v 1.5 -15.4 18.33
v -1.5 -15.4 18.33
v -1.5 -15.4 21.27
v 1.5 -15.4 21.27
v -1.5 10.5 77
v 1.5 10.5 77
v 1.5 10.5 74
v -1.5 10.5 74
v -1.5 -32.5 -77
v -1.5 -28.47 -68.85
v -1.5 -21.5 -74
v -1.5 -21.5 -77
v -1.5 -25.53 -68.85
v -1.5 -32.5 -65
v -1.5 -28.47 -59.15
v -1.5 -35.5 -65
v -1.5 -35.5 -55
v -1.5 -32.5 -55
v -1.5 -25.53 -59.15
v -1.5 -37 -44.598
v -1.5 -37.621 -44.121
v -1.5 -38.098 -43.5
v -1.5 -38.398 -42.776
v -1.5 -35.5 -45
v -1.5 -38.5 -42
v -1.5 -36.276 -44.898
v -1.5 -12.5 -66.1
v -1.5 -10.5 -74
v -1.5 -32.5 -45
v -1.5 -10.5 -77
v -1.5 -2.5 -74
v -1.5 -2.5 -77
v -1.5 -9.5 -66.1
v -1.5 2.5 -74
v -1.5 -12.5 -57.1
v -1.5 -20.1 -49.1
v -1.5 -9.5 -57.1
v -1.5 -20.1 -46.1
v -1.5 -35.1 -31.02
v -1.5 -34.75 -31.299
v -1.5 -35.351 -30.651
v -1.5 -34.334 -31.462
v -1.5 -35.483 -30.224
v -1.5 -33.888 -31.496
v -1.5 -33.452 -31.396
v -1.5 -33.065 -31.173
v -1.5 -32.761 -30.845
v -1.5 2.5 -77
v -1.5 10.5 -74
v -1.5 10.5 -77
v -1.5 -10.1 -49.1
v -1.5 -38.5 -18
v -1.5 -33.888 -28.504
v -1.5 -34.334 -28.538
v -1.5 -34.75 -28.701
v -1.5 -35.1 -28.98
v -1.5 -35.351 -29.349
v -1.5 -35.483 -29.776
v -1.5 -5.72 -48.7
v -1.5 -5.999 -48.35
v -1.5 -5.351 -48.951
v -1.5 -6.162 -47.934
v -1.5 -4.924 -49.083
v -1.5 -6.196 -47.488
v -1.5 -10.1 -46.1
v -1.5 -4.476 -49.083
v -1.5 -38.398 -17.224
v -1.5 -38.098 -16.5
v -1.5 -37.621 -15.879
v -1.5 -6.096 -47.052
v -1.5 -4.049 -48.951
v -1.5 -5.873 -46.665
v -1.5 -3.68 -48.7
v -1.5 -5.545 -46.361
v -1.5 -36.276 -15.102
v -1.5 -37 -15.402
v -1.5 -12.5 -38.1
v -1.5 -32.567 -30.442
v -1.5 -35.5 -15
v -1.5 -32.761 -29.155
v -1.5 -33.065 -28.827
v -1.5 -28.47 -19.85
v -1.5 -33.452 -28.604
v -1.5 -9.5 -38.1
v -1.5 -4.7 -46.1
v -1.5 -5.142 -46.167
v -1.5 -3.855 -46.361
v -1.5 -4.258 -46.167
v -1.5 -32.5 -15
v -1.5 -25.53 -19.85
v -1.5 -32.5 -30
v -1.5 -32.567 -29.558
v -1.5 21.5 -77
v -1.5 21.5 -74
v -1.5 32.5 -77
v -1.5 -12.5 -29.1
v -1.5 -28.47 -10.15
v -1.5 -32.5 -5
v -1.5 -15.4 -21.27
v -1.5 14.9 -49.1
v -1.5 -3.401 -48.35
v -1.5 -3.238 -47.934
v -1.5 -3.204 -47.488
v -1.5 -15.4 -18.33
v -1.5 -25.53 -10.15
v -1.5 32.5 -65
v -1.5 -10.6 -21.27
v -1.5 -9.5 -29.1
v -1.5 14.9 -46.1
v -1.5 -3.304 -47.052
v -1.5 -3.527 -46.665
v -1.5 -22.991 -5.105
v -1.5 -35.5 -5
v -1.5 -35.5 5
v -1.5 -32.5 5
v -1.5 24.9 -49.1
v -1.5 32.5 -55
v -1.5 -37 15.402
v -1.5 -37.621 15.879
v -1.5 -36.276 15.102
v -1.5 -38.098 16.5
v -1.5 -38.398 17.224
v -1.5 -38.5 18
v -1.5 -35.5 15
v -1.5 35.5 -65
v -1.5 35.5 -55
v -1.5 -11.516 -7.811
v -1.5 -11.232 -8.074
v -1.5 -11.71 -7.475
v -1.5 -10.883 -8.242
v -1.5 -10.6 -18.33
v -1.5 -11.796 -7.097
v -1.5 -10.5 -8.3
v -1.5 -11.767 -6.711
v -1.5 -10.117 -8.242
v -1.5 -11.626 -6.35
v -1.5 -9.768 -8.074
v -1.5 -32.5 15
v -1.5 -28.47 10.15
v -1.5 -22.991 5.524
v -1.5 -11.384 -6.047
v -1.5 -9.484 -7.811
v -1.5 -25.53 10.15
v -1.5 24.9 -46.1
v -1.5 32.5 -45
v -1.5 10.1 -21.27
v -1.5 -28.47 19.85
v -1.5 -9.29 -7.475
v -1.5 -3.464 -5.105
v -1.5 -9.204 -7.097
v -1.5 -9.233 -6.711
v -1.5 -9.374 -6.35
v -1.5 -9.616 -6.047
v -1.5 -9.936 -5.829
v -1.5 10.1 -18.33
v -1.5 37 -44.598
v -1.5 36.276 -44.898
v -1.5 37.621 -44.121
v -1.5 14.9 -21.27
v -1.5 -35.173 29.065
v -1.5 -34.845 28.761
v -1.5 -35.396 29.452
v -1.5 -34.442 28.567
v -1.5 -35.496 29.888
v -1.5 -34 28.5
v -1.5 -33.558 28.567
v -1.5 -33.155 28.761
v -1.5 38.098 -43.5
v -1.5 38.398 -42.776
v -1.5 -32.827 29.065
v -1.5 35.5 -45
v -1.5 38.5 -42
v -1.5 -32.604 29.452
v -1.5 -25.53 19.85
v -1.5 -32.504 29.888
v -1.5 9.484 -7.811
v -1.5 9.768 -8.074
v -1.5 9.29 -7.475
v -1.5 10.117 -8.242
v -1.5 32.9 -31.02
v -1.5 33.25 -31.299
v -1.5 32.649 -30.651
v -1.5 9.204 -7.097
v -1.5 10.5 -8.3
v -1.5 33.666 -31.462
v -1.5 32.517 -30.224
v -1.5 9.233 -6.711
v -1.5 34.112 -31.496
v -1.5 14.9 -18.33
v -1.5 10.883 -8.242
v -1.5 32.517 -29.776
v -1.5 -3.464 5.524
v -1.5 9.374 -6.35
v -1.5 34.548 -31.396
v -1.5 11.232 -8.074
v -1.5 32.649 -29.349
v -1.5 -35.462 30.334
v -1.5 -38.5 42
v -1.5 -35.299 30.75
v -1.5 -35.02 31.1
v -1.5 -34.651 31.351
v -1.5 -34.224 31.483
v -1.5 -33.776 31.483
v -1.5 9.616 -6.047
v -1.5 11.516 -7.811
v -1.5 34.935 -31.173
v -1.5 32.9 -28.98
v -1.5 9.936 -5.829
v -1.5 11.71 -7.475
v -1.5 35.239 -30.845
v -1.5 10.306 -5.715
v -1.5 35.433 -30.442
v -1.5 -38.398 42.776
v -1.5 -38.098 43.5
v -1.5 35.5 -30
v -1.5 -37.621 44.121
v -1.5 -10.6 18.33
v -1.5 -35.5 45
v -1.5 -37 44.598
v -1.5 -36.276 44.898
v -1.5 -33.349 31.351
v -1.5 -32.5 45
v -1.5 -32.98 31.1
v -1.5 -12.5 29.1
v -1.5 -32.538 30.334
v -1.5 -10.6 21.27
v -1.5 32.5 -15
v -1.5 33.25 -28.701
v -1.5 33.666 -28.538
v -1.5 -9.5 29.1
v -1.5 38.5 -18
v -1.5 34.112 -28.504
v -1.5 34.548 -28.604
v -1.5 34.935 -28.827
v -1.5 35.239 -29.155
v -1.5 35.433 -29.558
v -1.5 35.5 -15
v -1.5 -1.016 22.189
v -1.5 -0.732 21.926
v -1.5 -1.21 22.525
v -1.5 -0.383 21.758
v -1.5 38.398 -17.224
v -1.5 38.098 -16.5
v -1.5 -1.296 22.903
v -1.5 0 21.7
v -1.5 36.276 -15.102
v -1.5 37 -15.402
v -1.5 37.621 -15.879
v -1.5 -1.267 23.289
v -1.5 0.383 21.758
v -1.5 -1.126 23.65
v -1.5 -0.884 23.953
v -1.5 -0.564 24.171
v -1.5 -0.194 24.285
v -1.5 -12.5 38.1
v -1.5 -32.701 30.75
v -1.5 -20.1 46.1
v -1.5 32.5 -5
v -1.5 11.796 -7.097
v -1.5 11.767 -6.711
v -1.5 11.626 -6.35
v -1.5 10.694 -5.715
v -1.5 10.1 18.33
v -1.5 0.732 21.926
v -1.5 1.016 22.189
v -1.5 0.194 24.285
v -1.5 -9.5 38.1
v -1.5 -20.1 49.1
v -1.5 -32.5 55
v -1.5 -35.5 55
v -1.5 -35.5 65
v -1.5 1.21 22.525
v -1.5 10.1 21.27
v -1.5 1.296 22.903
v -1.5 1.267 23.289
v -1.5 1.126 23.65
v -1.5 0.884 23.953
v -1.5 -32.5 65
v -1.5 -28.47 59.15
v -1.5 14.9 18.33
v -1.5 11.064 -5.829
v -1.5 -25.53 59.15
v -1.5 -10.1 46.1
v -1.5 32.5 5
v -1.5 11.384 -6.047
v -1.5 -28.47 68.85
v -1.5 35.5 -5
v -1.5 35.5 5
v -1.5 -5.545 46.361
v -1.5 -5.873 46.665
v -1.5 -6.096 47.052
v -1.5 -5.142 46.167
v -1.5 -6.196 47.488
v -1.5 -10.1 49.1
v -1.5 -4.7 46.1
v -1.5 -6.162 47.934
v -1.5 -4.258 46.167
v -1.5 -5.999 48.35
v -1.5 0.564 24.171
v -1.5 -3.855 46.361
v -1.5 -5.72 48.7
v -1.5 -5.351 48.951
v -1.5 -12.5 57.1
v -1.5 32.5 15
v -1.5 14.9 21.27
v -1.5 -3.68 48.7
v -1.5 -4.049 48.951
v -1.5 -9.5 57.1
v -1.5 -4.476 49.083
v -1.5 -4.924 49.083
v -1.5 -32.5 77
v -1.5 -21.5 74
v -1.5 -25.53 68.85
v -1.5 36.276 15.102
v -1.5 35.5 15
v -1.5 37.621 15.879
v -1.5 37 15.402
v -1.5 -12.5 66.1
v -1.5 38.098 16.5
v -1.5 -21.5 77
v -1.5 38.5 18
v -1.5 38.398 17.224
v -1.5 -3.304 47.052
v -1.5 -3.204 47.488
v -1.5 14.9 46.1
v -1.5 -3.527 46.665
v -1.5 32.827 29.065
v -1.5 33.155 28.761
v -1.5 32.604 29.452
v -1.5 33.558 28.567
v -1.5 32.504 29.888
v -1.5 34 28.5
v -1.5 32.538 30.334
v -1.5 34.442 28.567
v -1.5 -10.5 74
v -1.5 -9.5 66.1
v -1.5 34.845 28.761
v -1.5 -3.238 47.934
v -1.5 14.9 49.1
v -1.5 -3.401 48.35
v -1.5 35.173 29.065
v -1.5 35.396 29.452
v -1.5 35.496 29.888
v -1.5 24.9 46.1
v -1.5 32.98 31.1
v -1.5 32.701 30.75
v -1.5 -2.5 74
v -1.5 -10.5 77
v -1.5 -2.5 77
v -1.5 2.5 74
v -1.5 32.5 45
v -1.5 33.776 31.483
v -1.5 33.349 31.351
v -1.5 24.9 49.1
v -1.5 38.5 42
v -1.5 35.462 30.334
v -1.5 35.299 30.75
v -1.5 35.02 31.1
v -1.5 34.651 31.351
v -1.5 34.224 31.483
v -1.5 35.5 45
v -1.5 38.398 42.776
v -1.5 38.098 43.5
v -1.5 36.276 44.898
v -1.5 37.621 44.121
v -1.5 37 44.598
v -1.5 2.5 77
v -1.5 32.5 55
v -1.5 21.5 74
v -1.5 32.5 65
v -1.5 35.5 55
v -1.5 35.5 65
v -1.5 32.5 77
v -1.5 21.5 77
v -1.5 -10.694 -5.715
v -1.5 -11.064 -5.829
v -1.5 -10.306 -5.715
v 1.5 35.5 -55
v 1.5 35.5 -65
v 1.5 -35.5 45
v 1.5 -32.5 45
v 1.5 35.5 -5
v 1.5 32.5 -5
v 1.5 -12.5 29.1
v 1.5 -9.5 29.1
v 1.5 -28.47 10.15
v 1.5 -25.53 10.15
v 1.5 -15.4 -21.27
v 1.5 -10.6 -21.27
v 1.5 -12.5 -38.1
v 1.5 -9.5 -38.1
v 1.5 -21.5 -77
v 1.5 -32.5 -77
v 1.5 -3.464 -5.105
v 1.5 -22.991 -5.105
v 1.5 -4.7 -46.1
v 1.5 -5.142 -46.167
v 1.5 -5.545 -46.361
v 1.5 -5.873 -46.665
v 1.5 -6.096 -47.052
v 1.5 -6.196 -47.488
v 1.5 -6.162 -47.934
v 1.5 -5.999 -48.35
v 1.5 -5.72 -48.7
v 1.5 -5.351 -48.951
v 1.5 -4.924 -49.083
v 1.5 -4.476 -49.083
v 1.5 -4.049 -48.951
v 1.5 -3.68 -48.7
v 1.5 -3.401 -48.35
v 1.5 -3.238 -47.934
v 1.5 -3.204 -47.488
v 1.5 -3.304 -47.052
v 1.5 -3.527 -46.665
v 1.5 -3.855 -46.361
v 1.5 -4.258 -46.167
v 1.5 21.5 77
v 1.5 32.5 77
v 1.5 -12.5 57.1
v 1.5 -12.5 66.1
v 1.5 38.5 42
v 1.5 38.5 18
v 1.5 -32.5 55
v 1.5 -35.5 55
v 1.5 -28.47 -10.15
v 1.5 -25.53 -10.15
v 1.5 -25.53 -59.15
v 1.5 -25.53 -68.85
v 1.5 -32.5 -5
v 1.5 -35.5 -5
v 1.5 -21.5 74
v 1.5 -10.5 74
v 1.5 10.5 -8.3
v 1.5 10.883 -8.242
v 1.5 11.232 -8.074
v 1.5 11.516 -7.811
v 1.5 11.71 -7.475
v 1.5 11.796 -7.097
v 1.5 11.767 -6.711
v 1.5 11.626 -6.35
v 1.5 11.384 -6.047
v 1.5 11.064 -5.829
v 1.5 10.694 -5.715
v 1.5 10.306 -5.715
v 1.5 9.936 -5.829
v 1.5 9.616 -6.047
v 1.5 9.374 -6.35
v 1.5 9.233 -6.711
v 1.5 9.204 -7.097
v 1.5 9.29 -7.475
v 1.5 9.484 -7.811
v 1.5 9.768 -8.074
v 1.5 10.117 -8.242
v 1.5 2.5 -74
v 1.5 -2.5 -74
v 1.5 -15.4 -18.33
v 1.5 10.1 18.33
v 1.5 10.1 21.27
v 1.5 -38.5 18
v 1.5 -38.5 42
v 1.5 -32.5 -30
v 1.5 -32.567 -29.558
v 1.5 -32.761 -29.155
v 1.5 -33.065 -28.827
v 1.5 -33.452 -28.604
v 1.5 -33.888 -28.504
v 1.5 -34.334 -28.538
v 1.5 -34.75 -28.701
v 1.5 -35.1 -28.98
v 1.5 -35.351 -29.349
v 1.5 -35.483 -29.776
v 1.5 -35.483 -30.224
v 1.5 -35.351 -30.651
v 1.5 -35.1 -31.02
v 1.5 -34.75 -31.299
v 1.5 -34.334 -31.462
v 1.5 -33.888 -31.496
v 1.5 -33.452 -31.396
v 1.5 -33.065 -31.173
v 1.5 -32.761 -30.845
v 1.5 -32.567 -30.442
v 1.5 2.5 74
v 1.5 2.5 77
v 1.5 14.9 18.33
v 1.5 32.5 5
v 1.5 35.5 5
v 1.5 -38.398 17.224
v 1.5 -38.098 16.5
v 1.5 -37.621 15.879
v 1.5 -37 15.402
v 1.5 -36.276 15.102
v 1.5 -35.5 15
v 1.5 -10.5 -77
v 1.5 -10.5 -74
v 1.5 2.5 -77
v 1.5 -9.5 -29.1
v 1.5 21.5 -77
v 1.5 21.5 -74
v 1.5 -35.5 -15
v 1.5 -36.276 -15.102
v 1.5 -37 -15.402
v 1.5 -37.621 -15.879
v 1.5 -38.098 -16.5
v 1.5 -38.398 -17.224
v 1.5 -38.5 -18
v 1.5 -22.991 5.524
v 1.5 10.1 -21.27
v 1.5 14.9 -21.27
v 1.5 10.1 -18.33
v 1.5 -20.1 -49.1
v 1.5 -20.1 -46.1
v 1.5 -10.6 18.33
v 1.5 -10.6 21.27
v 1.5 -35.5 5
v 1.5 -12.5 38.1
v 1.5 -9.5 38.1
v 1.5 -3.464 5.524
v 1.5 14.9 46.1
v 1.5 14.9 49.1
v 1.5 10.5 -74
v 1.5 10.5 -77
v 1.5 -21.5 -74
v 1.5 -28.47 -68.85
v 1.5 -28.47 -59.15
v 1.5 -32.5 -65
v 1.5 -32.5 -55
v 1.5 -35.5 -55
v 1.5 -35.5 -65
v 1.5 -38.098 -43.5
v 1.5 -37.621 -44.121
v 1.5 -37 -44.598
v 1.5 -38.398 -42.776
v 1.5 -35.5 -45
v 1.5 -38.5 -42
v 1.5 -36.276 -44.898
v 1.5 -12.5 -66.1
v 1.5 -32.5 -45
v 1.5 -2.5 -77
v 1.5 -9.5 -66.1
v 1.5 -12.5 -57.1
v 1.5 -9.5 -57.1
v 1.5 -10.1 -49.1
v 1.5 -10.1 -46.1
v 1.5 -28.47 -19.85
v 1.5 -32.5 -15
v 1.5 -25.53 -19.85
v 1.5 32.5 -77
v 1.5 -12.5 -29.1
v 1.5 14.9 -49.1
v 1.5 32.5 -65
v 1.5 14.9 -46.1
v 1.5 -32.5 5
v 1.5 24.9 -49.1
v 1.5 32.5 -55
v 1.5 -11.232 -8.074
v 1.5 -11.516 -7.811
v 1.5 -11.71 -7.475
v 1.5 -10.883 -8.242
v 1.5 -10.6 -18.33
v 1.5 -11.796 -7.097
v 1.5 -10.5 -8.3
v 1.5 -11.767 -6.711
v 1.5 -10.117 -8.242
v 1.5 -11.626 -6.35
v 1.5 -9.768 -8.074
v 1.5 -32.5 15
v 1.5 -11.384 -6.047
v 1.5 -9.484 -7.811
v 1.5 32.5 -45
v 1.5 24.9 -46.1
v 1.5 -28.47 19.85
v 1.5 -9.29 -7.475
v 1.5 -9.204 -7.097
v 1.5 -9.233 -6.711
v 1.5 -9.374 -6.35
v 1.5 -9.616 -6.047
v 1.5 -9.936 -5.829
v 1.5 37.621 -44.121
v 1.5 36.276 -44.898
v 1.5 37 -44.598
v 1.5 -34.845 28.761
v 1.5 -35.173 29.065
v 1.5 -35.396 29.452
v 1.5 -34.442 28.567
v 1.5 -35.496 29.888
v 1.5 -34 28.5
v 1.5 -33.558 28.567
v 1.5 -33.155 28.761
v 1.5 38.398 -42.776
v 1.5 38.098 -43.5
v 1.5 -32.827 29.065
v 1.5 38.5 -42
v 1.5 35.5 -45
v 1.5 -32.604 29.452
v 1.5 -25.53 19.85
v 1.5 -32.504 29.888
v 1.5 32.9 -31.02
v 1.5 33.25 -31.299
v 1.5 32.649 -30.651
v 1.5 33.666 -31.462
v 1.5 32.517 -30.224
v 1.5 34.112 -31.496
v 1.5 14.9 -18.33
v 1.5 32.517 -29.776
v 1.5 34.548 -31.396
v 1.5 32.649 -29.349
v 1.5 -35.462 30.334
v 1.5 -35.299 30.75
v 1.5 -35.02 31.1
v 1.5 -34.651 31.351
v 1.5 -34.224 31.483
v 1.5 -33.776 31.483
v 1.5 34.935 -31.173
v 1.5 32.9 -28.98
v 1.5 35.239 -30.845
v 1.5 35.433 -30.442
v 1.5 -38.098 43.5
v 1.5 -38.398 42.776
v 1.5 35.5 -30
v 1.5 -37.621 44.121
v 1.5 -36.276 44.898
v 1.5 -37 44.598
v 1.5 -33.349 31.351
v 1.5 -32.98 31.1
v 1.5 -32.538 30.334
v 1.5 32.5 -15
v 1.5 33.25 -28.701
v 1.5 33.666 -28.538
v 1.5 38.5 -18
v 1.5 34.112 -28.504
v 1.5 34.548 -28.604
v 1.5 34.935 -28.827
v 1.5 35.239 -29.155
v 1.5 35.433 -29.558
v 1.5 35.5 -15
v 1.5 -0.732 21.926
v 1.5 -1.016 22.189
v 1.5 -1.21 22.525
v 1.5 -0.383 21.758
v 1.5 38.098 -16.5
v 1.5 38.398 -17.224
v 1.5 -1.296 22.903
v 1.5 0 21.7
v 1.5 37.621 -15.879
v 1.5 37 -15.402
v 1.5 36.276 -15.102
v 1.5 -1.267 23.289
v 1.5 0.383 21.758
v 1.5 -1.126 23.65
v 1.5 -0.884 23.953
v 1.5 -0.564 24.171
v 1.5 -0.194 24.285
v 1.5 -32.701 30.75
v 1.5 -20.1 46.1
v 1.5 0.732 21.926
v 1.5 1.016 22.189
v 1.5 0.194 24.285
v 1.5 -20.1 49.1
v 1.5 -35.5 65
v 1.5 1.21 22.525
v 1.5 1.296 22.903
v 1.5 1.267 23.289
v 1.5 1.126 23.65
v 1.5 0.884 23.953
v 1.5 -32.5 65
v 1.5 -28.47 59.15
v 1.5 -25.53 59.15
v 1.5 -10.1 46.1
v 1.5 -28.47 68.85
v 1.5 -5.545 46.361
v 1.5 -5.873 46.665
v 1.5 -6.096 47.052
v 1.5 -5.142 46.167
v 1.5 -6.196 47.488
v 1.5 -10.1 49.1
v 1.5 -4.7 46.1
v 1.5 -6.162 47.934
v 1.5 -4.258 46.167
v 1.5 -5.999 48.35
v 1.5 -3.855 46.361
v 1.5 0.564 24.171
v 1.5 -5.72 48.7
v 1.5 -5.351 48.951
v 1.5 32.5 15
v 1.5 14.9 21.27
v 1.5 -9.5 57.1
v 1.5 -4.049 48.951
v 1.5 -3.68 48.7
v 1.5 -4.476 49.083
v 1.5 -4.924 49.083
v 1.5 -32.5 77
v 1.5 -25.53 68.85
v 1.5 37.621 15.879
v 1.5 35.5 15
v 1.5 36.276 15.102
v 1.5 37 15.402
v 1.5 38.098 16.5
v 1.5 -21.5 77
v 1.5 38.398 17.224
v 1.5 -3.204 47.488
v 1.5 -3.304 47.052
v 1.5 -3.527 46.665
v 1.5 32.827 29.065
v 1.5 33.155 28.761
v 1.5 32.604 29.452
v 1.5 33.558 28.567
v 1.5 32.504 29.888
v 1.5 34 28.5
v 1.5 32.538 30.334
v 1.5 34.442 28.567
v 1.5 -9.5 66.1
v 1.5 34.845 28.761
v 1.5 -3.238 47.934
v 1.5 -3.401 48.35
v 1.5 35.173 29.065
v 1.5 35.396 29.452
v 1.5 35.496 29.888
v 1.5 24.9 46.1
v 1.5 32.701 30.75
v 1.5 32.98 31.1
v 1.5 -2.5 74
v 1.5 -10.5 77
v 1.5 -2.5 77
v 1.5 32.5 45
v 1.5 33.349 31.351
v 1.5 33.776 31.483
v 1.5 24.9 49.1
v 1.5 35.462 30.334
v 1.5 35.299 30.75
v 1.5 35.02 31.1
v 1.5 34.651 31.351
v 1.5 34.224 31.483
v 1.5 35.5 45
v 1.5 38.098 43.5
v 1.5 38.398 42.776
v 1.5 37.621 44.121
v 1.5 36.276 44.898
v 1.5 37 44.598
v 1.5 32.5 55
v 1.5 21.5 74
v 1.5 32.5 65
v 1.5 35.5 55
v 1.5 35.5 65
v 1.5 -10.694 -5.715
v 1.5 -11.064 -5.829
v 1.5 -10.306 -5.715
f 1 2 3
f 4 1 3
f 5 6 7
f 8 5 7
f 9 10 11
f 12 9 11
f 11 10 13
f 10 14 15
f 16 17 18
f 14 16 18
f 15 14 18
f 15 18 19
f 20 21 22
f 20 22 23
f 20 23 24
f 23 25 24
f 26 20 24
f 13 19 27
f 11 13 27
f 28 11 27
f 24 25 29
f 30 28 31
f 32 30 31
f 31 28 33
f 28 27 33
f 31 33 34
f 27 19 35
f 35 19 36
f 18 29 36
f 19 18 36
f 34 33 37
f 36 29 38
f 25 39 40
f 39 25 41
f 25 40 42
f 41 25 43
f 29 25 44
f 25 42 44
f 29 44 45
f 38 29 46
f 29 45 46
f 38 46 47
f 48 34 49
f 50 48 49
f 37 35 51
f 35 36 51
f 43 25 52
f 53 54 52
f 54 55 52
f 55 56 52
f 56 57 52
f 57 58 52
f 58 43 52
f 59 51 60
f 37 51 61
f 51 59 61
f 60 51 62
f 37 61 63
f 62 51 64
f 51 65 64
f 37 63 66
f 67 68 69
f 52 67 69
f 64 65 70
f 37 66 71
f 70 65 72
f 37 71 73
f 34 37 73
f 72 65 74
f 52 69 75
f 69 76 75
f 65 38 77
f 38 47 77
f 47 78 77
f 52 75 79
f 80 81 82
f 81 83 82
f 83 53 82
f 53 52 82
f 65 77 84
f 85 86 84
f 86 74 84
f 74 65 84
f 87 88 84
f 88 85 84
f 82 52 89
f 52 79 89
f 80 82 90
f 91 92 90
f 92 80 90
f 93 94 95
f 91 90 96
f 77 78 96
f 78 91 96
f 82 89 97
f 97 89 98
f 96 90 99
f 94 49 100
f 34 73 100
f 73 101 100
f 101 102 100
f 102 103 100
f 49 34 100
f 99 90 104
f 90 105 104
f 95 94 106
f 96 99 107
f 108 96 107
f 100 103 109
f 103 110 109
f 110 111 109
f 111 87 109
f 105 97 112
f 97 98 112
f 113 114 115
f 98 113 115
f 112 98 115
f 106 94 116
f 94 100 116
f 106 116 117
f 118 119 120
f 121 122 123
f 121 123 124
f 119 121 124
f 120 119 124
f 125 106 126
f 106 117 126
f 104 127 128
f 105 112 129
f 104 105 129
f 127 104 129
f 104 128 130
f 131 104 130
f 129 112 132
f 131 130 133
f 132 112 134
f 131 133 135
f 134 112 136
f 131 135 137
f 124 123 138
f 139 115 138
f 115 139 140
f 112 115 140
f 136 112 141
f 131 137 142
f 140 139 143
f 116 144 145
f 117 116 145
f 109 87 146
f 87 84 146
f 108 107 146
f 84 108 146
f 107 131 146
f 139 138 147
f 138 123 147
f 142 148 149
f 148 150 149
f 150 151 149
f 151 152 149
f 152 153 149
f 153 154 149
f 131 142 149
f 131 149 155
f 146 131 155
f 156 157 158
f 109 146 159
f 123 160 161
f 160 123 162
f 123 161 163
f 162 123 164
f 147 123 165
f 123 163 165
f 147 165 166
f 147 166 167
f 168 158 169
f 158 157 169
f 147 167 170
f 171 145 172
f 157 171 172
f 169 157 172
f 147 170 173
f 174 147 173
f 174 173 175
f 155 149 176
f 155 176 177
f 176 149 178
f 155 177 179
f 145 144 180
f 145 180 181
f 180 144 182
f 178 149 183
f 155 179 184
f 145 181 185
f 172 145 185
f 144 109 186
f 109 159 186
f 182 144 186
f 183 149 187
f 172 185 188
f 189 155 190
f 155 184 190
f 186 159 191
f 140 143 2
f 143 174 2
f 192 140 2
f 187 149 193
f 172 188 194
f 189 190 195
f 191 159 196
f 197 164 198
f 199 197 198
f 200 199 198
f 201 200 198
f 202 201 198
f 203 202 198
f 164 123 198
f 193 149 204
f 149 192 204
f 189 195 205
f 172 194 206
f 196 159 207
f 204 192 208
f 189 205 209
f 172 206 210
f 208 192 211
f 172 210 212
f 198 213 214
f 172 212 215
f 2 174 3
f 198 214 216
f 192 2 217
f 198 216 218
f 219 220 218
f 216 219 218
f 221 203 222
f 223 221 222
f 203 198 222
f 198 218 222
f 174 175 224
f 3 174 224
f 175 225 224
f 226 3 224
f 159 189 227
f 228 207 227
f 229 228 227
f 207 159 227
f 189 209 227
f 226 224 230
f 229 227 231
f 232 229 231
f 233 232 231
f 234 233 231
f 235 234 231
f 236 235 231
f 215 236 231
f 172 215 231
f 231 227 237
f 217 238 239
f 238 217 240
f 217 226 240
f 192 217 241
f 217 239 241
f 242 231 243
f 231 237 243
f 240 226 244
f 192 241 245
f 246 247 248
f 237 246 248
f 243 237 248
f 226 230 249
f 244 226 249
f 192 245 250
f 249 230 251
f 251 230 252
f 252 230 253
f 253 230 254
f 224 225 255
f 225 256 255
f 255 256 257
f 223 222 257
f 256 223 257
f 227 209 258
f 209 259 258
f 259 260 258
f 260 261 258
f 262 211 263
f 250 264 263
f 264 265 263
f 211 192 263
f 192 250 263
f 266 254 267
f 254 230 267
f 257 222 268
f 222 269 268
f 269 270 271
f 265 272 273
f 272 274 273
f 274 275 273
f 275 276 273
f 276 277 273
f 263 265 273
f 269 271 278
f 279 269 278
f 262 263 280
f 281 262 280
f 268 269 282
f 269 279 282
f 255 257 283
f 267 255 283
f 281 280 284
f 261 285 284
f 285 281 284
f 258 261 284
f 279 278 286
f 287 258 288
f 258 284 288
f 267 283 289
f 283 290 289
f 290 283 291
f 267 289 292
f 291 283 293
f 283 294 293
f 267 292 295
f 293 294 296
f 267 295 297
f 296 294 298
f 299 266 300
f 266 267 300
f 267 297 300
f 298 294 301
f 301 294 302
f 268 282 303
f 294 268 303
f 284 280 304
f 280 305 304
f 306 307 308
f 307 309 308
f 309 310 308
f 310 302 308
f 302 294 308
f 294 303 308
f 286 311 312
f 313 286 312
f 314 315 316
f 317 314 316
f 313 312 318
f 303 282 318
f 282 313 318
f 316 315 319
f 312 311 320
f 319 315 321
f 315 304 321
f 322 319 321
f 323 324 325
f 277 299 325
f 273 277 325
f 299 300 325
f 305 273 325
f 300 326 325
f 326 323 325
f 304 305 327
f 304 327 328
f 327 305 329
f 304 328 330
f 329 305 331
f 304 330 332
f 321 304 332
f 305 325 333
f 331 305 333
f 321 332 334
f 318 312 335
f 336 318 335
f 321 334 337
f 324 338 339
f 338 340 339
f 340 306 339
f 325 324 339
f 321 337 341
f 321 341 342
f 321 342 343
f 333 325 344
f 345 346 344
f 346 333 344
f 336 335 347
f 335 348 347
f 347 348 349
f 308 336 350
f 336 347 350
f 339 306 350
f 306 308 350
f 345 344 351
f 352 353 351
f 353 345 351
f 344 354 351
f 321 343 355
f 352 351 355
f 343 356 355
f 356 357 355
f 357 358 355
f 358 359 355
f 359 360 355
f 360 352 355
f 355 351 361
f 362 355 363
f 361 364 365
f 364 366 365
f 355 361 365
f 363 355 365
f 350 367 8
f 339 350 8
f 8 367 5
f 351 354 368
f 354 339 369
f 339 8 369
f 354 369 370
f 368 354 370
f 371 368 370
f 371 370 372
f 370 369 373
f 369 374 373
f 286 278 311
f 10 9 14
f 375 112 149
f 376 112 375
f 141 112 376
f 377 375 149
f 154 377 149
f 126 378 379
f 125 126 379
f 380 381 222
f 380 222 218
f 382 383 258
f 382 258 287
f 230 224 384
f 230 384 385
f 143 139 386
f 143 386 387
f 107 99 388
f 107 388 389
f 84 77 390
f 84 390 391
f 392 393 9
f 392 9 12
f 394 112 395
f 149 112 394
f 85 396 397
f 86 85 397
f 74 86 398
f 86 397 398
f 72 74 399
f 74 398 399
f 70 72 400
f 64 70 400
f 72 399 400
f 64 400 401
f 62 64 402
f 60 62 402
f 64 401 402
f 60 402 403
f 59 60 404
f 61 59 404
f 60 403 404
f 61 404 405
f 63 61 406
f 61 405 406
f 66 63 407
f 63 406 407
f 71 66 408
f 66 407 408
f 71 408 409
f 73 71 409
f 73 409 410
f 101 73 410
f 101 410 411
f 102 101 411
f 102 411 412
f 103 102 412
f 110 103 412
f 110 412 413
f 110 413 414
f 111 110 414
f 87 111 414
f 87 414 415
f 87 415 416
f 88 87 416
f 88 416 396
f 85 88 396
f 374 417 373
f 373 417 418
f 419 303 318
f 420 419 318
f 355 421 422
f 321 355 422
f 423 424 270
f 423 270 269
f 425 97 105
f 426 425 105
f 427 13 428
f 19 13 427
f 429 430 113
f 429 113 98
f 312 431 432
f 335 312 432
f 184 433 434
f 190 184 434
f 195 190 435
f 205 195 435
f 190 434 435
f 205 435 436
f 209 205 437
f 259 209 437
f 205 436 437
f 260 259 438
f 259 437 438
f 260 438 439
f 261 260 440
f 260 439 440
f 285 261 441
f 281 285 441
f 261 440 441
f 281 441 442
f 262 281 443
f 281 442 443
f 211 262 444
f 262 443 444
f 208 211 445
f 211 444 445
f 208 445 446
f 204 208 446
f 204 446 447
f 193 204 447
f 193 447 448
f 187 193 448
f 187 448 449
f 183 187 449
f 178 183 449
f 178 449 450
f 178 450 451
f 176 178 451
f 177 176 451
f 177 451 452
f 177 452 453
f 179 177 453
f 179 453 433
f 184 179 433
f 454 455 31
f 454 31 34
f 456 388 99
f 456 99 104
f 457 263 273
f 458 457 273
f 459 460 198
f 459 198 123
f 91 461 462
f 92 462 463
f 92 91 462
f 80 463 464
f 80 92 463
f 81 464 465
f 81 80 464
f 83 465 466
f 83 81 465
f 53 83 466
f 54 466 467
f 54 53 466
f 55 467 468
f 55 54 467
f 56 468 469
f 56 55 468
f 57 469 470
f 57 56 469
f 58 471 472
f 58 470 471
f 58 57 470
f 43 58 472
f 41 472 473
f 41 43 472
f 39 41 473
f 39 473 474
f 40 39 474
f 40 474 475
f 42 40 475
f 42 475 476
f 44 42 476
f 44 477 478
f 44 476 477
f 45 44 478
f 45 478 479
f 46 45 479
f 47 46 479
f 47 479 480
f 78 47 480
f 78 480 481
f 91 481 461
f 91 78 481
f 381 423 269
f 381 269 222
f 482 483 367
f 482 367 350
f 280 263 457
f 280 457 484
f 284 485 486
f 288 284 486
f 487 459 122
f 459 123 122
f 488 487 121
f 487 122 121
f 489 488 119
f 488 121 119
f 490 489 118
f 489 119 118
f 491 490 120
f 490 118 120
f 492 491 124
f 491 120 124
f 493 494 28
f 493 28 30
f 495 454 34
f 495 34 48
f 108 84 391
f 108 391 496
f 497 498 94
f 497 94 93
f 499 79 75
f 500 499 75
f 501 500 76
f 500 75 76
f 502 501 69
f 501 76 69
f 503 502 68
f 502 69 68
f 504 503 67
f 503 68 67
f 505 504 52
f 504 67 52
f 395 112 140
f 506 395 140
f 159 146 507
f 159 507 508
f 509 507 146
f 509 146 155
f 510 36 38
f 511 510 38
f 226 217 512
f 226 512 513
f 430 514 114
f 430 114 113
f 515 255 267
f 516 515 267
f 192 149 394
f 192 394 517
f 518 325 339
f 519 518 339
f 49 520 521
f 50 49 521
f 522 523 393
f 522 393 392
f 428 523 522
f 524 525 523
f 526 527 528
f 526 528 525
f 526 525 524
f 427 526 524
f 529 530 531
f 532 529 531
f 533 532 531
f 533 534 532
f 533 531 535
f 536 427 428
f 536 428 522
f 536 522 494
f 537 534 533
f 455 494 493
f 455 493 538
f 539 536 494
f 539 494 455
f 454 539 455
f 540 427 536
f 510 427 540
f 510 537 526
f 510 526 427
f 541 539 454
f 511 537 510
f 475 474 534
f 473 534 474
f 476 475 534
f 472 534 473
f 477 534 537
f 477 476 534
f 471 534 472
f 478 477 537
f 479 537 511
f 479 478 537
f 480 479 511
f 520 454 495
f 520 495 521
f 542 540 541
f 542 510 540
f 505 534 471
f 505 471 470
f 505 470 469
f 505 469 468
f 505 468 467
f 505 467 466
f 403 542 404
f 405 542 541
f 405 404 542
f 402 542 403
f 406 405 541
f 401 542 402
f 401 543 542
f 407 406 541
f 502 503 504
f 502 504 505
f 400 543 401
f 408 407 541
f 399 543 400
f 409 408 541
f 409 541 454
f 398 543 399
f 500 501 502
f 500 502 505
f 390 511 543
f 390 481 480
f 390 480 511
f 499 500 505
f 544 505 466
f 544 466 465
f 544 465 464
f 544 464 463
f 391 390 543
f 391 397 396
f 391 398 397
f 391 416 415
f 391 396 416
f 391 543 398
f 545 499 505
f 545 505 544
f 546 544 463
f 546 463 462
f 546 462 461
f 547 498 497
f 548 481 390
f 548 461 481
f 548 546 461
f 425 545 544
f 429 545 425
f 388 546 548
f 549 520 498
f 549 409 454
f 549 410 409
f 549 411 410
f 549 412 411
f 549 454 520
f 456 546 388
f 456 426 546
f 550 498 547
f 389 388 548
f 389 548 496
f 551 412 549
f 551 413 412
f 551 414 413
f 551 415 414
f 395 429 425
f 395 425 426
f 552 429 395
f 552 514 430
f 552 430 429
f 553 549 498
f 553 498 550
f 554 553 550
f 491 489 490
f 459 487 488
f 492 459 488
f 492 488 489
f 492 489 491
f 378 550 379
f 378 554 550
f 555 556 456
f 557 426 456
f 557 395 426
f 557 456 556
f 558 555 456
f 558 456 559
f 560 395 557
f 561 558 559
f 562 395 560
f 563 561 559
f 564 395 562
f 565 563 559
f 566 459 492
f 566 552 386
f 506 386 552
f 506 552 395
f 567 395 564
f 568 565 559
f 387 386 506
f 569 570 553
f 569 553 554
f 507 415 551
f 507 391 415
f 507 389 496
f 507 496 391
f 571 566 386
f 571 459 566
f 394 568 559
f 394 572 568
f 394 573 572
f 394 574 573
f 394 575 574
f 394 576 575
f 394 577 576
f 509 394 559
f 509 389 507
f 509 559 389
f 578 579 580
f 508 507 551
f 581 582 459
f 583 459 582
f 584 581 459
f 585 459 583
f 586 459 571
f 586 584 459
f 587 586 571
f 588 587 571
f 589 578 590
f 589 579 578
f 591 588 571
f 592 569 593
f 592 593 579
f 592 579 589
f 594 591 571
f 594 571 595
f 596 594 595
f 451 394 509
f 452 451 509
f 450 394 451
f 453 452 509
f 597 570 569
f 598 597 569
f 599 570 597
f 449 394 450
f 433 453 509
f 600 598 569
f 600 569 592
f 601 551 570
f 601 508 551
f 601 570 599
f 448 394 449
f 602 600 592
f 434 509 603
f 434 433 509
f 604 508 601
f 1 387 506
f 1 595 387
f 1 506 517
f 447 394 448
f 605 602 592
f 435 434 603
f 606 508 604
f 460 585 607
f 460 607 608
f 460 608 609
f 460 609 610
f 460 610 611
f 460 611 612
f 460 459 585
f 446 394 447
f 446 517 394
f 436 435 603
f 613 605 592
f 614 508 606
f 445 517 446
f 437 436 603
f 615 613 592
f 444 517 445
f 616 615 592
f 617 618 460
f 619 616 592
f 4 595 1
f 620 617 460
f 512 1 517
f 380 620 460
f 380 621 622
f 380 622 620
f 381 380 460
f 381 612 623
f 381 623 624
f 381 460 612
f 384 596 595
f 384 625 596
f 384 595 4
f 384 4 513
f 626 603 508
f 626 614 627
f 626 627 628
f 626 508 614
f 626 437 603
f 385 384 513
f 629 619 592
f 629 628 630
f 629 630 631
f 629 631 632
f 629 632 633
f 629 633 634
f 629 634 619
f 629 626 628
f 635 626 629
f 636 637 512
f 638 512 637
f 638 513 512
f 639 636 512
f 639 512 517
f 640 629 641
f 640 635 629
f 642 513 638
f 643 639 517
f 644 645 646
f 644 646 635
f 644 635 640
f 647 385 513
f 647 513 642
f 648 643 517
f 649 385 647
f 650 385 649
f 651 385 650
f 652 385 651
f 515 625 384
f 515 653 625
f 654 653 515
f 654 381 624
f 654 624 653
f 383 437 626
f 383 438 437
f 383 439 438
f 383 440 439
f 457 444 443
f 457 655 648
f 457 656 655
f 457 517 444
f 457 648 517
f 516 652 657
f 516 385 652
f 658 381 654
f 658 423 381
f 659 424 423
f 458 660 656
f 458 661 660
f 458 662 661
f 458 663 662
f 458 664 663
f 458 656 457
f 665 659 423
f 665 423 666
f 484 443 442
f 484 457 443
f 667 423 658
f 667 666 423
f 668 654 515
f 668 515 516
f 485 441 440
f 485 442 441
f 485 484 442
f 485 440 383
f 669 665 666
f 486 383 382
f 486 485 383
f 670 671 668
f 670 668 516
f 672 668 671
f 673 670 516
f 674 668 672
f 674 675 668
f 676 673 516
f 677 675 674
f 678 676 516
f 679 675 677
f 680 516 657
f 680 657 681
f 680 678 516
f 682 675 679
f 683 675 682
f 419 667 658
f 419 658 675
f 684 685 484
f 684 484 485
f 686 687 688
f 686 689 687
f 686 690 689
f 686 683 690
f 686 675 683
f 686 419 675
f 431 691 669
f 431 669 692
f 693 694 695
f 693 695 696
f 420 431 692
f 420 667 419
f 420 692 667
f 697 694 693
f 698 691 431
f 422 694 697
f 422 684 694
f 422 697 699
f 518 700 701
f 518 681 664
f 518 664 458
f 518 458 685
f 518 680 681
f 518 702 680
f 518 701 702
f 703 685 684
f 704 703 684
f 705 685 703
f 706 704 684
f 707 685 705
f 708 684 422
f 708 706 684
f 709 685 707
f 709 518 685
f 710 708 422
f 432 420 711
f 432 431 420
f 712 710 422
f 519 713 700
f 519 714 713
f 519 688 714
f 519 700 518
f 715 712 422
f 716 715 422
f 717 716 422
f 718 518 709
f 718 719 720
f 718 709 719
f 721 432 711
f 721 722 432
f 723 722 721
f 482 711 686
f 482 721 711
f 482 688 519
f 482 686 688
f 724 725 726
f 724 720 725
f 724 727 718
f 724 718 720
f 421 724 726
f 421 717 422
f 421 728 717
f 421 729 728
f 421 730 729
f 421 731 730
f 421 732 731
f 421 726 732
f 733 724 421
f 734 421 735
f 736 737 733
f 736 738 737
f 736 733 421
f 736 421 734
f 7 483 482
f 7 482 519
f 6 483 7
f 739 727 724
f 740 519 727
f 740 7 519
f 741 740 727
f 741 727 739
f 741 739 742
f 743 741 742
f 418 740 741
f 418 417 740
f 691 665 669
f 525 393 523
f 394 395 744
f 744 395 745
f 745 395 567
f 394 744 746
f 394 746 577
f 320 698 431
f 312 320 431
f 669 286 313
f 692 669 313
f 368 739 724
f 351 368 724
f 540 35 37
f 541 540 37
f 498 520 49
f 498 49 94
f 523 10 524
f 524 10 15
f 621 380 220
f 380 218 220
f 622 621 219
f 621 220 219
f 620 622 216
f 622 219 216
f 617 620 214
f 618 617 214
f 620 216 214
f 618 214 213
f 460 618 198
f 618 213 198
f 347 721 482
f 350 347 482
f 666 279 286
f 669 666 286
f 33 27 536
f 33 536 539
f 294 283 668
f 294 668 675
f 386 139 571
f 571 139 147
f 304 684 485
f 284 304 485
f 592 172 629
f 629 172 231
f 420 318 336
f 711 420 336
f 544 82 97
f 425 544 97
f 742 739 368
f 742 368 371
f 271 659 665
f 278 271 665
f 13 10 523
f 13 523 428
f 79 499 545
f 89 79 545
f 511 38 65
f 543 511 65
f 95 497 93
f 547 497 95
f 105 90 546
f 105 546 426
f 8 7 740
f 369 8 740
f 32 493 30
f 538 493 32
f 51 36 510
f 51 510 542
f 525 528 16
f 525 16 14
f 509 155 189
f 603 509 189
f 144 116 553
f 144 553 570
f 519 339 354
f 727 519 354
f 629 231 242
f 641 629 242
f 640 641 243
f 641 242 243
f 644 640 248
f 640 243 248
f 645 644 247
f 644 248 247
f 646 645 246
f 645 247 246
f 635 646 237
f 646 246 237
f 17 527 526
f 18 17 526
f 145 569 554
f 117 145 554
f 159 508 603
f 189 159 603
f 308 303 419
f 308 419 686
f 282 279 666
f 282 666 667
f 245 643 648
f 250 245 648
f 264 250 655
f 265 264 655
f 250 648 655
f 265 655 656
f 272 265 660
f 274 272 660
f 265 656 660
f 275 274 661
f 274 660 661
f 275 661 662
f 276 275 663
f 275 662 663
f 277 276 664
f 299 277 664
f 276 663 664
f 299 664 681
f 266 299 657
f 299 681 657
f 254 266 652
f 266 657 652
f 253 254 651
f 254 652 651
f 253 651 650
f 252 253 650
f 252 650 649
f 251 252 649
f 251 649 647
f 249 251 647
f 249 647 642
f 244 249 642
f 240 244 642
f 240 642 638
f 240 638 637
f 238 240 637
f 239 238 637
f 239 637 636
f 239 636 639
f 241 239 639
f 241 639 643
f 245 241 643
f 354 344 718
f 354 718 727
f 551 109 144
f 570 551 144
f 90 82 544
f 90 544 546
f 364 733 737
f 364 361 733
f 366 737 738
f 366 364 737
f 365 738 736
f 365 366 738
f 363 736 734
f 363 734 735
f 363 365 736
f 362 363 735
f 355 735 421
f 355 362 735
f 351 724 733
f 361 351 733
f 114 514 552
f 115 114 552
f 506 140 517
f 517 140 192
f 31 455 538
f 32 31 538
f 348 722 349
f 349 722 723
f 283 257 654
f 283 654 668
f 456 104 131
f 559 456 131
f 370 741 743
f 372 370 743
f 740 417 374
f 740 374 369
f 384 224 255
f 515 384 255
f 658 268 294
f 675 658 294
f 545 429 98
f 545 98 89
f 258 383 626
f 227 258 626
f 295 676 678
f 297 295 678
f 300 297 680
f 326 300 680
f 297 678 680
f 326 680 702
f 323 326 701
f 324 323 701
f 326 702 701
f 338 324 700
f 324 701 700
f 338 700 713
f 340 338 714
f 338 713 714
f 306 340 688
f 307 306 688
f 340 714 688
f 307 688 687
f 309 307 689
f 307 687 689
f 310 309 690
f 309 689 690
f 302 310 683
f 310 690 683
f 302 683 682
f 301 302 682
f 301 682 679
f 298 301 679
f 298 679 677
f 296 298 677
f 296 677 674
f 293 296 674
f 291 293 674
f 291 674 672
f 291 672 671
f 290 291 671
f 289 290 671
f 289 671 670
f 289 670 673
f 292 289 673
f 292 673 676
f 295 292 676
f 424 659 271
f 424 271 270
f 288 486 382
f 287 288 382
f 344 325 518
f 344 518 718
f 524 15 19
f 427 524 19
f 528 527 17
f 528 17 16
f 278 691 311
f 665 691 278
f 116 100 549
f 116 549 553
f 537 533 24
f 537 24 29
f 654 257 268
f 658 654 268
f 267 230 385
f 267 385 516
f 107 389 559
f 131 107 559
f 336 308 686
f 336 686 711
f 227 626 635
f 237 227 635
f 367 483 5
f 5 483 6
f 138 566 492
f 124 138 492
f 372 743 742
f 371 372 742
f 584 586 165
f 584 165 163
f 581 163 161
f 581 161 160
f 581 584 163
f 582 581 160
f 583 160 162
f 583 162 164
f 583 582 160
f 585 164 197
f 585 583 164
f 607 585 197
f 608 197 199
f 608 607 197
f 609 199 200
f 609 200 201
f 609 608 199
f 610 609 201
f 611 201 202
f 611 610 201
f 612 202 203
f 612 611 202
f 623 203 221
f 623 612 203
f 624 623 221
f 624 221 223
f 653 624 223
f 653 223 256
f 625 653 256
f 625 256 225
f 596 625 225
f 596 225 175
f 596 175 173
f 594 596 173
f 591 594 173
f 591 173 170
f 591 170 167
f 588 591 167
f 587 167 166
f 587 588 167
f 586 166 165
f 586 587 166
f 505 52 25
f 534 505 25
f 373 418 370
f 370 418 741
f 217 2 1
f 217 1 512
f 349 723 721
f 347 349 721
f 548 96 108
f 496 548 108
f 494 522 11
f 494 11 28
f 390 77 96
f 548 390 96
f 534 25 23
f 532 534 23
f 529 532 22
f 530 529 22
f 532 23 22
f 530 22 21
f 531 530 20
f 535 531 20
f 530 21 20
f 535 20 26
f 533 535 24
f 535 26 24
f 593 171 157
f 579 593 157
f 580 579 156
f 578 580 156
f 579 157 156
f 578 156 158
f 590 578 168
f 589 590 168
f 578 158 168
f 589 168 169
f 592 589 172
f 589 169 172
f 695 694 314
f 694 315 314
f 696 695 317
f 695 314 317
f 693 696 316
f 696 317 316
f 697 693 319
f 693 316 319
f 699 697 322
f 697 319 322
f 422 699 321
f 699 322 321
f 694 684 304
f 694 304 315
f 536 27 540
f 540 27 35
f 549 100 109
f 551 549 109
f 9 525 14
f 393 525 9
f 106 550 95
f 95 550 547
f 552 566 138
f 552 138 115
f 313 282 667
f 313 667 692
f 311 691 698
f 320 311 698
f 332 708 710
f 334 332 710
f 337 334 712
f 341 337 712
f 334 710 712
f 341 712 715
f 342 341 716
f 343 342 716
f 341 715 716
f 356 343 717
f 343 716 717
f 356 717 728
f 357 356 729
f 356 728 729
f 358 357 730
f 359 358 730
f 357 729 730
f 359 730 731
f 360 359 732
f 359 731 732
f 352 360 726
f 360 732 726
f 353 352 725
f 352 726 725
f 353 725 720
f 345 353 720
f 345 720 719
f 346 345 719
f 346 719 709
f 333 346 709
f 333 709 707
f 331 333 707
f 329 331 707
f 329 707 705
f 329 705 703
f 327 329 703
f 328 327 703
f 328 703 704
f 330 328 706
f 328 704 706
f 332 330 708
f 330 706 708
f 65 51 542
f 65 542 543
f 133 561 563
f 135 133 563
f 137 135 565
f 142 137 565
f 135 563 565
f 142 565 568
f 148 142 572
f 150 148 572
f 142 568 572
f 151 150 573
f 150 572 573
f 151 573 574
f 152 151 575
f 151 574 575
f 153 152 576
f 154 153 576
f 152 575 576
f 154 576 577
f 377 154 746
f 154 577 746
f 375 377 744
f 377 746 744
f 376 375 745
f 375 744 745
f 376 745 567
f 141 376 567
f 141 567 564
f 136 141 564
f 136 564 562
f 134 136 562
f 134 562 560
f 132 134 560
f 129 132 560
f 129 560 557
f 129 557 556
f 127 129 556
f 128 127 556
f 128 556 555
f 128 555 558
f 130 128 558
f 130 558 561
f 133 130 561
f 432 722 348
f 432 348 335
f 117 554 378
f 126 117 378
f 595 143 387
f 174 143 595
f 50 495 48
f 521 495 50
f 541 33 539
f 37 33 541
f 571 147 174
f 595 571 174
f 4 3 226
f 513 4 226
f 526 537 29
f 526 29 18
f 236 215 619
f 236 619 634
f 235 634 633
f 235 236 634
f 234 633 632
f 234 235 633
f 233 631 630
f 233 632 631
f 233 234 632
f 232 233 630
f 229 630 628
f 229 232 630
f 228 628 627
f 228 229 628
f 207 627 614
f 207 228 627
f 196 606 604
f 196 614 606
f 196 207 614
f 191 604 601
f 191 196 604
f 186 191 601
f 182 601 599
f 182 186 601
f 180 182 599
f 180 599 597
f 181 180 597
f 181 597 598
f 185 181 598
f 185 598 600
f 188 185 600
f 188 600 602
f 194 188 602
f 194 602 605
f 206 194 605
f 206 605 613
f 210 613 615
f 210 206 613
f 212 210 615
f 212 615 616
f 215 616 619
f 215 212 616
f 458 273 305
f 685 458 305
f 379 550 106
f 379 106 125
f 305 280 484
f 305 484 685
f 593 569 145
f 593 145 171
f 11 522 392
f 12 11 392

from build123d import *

# Parameters (mm, degrees)
CROQUIS1_W               = 154
CROQUIS1_H               = 71
SALIENTE_EXTRUIR1_DEPTH  = 1.5
CROQUIS2_W               = 12
CROQUIS2_H               = 3
CROQUIS2_W_2             = 10
CROQUIS2_W_3             = 3
CROQUIS2_H_2             = 11
CROQUIS2_H_3             = 5
CORTAR_EXTRUIR1_DEPTH    = 13
CROQUIS4_W               = 30
CROQUIS4_H               = 3
SALIENTE_EXTRUIR3_DEPTH  = 3
REDONDEO2_R              = 3
CROQUIS5_R               = 1.5
CORTAR_EXTRUIR2_DEPTH    = 3
REDONDEO2_OF_SIMETR_A4_R = 3
SIMETR_A5_START          = -2
SIMETR_A5_OUTLINE_R      = 1.5
SIMETR_A5_DEPTH          = 4
SIMETR_A5_START_2        = -1.5
SIMETR_A5_2_DEPTH        = 3
CROQUIS6_W               = 3
CROQUIS6_H               = 10
CROQUIS6_W_2             = 9.7
CROQUIS6_H_2             = 2.94
CROQUIS6_W_3             = 10.628979849
CROQUIS6_H_3             = 19.526562675
CORTAR_EXTRUIR3_DEPTH    = 10
CROQUIS7_R               = 1.5
CORTAR_EXTRUIR4_DEPTH    = 10
CROQUIS8_W               = 9
CROQUIS8_H               = 3
CORTAR_EXTRUIR5_DEPTH    = 10
CROQUIS9_R               = 1.3
CORTAR_EXTRUIR6_DEPTH    = 10
CROQUIS10_W              = 2.94
CROQUIS10_H              = 4.8
CORTAR_EXTRUIR7_DEPTH    = 23


with BuildPart() as part:
    # Croquis1 → Saliente-Extruir1 (new, symmetric)
    with BuildSketch(Plane(origin=(0, 0, 0), x_dir=(0, 0, -1), z_dir=(1, 0, 0))):
        Rectangle(CROQUIS1_W, CROQUIS1_H)
    extrude(amount=SALIENTE_EXTRUIR1_DEPTH, both=True)

    # Croquis2 → Cortar-Extruir1 (cut)
    with BuildSketch(Plane(origin=(1.5, 0, 0), x_dir=(0, 0, -1), z_dir=(1, 0, 0))):
        with Locations((-71, 34)):
            Rectangle(CROQUIS2_W, CROQUIS2_H)
        with Locations((-50, 34)):
            Rectangle(CROQUIS2_W_2, CROQUIS2_H)
        with Locations((-10, 34)):
            Rectangle(CROQUIS2_W_2, CROQUIS2_H)
        with Locations((10, 34)):
            Rectangle(CROQUIS2_W_2, CROQUIS2_H)
        with Locations((50, 34)):
            Rectangle(CROQUIS2_W_2, CROQUIS2_H)
        with Locations((71, 34)):
            Rectangle(CROQUIS2_W, CROQUIS2_H)
        with Locations((50, -34)):
            Rectangle(CROQUIS2_W_2, CROQUIS2_H)
        with Locations((10, -34)):
            Rectangle(CROQUIS2_W_2, CROQUIS2_H)
        with Locations((-10, -34)):
            Rectangle(CROQUIS2_W_2, CROQUIS2_H)
        with Locations((-50, -34)):
            Rectangle(CROQUIS2_W_2, CROQUIS2_H)
        with Locations((-71, -34)):
            Rectangle(CROQUIS2_W, CROQUIS2_H)
        with Locations((71, -34)):
            Rectangle(CROQUIS2_W, CROQUIS2_H)
        with Locations((-75.5, -16)):
            Rectangle(CROQUIS2_W_3, CROQUIS2_H_2)
        with Locations((-75.5, 0)):
            Rectangle(CROQUIS2_W_3, CROQUIS2_H_3)
        with Locations((-75.5, 16)):
            Rectangle(CROQUIS2_W_3, CROQUIS2_H_2)
        with Locations((75.5, -16)):
            Rectangle(CROQUIS2_W_3, CROQUIS2_H_2)
        with Locations((75.5, 16)):
            Rectangle(CROQUIS2_W_3, CROQUIS2_H_2)
        with Locations((75.5, 0)):
            Rectangle(CROQUIS2_W_3, CROQUIS2_H_3)
    extrude(amount=-CORTAR_EXTRUIR1_DEPTH, mode=Mode.SUBTRACT)

    # Croquis4 → Saliente-Extruir3 (add)
    with BuildSketch(Plane(origin=(1.5, 0, 0), x_dir=(0, 0, -1), z_dir=(1, 0, 0))):
        with Locations((-30, 37)):
            Rectangle(CROQUIS4_W, CROQUIS4_H)
    saliente_extruir3 = extrude(amount=-SALIENTE_EXTRUIR3_DEPTH)

    # Redondeo2
    redondeo2_edges = [part.edges().sort_by_distance(p)[0] for p in [
        (0, 38.5, 45),
        (0, 38.5, 15),
    ]]
    fillet(redondeo2_edges, radius=REDONDEO2_R)

    # Croquis5 → Cortar-Extruir2 (cut)
    with BuildSketch(Plane(origin=(1.5, 0, 0), x_dir=(0, 0, -1), z_dir=(1, 0, 0))):
        with Locations((-30, 34)):
            Circle(CROQUIS5_R)
    cortar_extruir2 = extrude(amount=-CORTAR_EXTRUIR2_DEPTH, mode=Mode.SUBTRACT)

    # Simetría4: Saliente-Extruir3, Cortar-Extruir2 across plane
    add(saliente_extruir3.mirror(Plane.ZX))
    add(cortar_extruir2.mirror(Plane.ZX), mode=Mode.SUBTRACT)

    # Redondeo2 of Simetría4
    redondeo2_of_simetr_a4_edges = [part.edges().sort_by_distance(p)[0] for p in [
        (0, -38.5, 45),
        (0, -38.5, 15),
    ]]
    fillet(redondeo2_of_simetr_a4_edges, radius=REDONDEO2_OF_SIMETR_A4_R)

    # Simetría5: read off the stored shape, not the designer's step
    # Simetría5 outline → Simetría5 (cut)
    with BuildSketch(Plane.YZ.offset(SIMETR_A5_START)):
        with Locations((34, -30)):
            Circle(SIMETR_A5_OUTLINE_R)
        with Locations((-34, -30)):
            Circle(SIMETR_A5_OUTLINE_R)
    extrude(amount=SIMETR_A5_DEPTH, mode=Mode.SUBTRACT)

    # Simetr_a5 2 outline → Simetr_a5 2 (add)
    with BuildSketch(Plane.YZ.offset(SIMETR_A5_START_2)):
        with BuildLine():
            Line((38.5, -42), (38.5, -18))
            ThreePointArc((38.5, -18), (37.621320344, -15.878679656), (35.5, -15))
            Line((35.5, -15), (35.5, -45))
            ThreePointArc((35.5, -45), (37.621320344, -44.121320344), (38.5, -42))
        make_face()
        with BuildLine():
            ThreePointArc((-35.5, -15), (-37.621320344, -15.878679656), (-38.5, -18))
            Line((-38.5, -18), (-38.5, -42))
            ThreePointArc((-38.5, -42), (-37.621320344, -44.121320344), (-35.5, -45))
            Line((-35.5, -45), (-35.5, -15))
        make_face()
    extrude(amount=SIMETR_A5_2_DEPTH)

    # Croquis6 → Cortar-Extruir3 (cut)
    with BuildSketch(Plane.ZY.offset(1.5)):
        with Locations((47.6, -15.1)):
            Rectangle(CROQUIS6_W, CROQUIS6_H)
        with Locations((47.6, 19.9)):
            Rectangle(CROQUIS6_W, CROQUIS6_H)
        with Locations((-47.6, -15.1)):
            Rectangle(CROQUIS6_W, CROQUIS6_H)
        with Locations((-47.6, 19.9)):
            Rectangle(CROQUIS6_W, CROQUIS6_H)
        with Locations((15, -27)):
            Rectangle(CROQUIS6_W_2, CROQUIS6_H_2)
        with Locations((64, -27)):
            Rectangle(CROQUIS6_W_2, CROQUIS6_H_2)
        with Locations((-64, -27)):
            Rectangle(CROQUIS6_W_2, CROQUIS6_H_2)
        with Locations((-15, -27)):
            Rectangle(CROQUIS6_W_2, CROQUIS6_H_2)
        with Locations((0.209178282, -13.227366202)):
            Rectangle(CROQUIS6_W_3, CROQUIS6_H_3)
    extrude(amount=-CORTAR_EXTRUIR3_DEPTH, mode=Mode.SUBTRACT)

    # Croquis7 → Cortar-Extruir4 (cut)
    with BuildSketch(Plane(origin=(1.5, 0, 0), x_dir=(0, 0, -1), z_dir=(1, 0, 0))):
        with Locations((-47.6, -4.7)):
            Circle(CROQUIS7_R)
        with Locations(Location((47.6, -4.7, 0), (0, 0, 180))):
            Circle(CROQUIS7_R)
    extrude(amount=-CORTAR_EXTRUIR4_DEPTH, mode=Mode.SUBTRACT)

    # Croquis8 → Cortar-Extruir5 (cut)
    with BuildSketch(Plane.ZY.offset(1.5)):
        with Locations((-33.6, -11)):
            Rectangle(CROQUIS8_W, CROQUIS8_H)
        with Locations((-61.6, -11)):
            Rectangle(CROQUIS8_W, CROQUIS8_H)
        with Locations((33.6, -11)):
            Rectangle(CROQUIS8_W, CROQUIS8_H)
        with Locations((61.6, -11)):
            Rectangle(CROQUIS8_W, CROQUIS8_H)
    extrude(amount=-CORTAR_EXTRUIR5_DEPTH, mode=Mode.SUBTRACT)

    # Croquis9 → Cortar-Extruir6 (cut)
    with BuildSketch(Plane(origin=(1.5, 0, 0), x_dir=(0, 0, -1), z_dir=(1, 0, 0))):
        with Locations((-23, 0)):
            Circle(CROQUIS9_R)
        with Locations((7, 10.5)):
            Circle(CROQUIS9_R)
        with Locations((7, -10.5)):
            Circle(CROQUIS9_R)
    extrude(amount=-CORTAR_EXTRUIR6_DEPTH, mode=Mode.SUBTRACT)

    # Croquis10 → Cortar-Extruir7 (cut)
    with BuildSketch(Plane.ZY.offset(1.5)):
        with Locations((-19.8, 12.5)):
            Rectangle(CROQUIS10_W, CROQUIS10_H)
        with Locations((-19.8, -13)):
            Rectangle(CROQUIS10_W, CROQUIS10_H)
        with Locations((19.8, 12.5)):
            Rectangle(CROQUIS10_W, CROQUIS10_H)
        with Locations((19.8, -13)):
            Rectangle(CROQUIS10_W, CROQUIS10_H)
    extrude(amount=-CORTAR_EXTRUIR7_DEPTH, mode=Mode.SUBTRACT)


solid = part.part
